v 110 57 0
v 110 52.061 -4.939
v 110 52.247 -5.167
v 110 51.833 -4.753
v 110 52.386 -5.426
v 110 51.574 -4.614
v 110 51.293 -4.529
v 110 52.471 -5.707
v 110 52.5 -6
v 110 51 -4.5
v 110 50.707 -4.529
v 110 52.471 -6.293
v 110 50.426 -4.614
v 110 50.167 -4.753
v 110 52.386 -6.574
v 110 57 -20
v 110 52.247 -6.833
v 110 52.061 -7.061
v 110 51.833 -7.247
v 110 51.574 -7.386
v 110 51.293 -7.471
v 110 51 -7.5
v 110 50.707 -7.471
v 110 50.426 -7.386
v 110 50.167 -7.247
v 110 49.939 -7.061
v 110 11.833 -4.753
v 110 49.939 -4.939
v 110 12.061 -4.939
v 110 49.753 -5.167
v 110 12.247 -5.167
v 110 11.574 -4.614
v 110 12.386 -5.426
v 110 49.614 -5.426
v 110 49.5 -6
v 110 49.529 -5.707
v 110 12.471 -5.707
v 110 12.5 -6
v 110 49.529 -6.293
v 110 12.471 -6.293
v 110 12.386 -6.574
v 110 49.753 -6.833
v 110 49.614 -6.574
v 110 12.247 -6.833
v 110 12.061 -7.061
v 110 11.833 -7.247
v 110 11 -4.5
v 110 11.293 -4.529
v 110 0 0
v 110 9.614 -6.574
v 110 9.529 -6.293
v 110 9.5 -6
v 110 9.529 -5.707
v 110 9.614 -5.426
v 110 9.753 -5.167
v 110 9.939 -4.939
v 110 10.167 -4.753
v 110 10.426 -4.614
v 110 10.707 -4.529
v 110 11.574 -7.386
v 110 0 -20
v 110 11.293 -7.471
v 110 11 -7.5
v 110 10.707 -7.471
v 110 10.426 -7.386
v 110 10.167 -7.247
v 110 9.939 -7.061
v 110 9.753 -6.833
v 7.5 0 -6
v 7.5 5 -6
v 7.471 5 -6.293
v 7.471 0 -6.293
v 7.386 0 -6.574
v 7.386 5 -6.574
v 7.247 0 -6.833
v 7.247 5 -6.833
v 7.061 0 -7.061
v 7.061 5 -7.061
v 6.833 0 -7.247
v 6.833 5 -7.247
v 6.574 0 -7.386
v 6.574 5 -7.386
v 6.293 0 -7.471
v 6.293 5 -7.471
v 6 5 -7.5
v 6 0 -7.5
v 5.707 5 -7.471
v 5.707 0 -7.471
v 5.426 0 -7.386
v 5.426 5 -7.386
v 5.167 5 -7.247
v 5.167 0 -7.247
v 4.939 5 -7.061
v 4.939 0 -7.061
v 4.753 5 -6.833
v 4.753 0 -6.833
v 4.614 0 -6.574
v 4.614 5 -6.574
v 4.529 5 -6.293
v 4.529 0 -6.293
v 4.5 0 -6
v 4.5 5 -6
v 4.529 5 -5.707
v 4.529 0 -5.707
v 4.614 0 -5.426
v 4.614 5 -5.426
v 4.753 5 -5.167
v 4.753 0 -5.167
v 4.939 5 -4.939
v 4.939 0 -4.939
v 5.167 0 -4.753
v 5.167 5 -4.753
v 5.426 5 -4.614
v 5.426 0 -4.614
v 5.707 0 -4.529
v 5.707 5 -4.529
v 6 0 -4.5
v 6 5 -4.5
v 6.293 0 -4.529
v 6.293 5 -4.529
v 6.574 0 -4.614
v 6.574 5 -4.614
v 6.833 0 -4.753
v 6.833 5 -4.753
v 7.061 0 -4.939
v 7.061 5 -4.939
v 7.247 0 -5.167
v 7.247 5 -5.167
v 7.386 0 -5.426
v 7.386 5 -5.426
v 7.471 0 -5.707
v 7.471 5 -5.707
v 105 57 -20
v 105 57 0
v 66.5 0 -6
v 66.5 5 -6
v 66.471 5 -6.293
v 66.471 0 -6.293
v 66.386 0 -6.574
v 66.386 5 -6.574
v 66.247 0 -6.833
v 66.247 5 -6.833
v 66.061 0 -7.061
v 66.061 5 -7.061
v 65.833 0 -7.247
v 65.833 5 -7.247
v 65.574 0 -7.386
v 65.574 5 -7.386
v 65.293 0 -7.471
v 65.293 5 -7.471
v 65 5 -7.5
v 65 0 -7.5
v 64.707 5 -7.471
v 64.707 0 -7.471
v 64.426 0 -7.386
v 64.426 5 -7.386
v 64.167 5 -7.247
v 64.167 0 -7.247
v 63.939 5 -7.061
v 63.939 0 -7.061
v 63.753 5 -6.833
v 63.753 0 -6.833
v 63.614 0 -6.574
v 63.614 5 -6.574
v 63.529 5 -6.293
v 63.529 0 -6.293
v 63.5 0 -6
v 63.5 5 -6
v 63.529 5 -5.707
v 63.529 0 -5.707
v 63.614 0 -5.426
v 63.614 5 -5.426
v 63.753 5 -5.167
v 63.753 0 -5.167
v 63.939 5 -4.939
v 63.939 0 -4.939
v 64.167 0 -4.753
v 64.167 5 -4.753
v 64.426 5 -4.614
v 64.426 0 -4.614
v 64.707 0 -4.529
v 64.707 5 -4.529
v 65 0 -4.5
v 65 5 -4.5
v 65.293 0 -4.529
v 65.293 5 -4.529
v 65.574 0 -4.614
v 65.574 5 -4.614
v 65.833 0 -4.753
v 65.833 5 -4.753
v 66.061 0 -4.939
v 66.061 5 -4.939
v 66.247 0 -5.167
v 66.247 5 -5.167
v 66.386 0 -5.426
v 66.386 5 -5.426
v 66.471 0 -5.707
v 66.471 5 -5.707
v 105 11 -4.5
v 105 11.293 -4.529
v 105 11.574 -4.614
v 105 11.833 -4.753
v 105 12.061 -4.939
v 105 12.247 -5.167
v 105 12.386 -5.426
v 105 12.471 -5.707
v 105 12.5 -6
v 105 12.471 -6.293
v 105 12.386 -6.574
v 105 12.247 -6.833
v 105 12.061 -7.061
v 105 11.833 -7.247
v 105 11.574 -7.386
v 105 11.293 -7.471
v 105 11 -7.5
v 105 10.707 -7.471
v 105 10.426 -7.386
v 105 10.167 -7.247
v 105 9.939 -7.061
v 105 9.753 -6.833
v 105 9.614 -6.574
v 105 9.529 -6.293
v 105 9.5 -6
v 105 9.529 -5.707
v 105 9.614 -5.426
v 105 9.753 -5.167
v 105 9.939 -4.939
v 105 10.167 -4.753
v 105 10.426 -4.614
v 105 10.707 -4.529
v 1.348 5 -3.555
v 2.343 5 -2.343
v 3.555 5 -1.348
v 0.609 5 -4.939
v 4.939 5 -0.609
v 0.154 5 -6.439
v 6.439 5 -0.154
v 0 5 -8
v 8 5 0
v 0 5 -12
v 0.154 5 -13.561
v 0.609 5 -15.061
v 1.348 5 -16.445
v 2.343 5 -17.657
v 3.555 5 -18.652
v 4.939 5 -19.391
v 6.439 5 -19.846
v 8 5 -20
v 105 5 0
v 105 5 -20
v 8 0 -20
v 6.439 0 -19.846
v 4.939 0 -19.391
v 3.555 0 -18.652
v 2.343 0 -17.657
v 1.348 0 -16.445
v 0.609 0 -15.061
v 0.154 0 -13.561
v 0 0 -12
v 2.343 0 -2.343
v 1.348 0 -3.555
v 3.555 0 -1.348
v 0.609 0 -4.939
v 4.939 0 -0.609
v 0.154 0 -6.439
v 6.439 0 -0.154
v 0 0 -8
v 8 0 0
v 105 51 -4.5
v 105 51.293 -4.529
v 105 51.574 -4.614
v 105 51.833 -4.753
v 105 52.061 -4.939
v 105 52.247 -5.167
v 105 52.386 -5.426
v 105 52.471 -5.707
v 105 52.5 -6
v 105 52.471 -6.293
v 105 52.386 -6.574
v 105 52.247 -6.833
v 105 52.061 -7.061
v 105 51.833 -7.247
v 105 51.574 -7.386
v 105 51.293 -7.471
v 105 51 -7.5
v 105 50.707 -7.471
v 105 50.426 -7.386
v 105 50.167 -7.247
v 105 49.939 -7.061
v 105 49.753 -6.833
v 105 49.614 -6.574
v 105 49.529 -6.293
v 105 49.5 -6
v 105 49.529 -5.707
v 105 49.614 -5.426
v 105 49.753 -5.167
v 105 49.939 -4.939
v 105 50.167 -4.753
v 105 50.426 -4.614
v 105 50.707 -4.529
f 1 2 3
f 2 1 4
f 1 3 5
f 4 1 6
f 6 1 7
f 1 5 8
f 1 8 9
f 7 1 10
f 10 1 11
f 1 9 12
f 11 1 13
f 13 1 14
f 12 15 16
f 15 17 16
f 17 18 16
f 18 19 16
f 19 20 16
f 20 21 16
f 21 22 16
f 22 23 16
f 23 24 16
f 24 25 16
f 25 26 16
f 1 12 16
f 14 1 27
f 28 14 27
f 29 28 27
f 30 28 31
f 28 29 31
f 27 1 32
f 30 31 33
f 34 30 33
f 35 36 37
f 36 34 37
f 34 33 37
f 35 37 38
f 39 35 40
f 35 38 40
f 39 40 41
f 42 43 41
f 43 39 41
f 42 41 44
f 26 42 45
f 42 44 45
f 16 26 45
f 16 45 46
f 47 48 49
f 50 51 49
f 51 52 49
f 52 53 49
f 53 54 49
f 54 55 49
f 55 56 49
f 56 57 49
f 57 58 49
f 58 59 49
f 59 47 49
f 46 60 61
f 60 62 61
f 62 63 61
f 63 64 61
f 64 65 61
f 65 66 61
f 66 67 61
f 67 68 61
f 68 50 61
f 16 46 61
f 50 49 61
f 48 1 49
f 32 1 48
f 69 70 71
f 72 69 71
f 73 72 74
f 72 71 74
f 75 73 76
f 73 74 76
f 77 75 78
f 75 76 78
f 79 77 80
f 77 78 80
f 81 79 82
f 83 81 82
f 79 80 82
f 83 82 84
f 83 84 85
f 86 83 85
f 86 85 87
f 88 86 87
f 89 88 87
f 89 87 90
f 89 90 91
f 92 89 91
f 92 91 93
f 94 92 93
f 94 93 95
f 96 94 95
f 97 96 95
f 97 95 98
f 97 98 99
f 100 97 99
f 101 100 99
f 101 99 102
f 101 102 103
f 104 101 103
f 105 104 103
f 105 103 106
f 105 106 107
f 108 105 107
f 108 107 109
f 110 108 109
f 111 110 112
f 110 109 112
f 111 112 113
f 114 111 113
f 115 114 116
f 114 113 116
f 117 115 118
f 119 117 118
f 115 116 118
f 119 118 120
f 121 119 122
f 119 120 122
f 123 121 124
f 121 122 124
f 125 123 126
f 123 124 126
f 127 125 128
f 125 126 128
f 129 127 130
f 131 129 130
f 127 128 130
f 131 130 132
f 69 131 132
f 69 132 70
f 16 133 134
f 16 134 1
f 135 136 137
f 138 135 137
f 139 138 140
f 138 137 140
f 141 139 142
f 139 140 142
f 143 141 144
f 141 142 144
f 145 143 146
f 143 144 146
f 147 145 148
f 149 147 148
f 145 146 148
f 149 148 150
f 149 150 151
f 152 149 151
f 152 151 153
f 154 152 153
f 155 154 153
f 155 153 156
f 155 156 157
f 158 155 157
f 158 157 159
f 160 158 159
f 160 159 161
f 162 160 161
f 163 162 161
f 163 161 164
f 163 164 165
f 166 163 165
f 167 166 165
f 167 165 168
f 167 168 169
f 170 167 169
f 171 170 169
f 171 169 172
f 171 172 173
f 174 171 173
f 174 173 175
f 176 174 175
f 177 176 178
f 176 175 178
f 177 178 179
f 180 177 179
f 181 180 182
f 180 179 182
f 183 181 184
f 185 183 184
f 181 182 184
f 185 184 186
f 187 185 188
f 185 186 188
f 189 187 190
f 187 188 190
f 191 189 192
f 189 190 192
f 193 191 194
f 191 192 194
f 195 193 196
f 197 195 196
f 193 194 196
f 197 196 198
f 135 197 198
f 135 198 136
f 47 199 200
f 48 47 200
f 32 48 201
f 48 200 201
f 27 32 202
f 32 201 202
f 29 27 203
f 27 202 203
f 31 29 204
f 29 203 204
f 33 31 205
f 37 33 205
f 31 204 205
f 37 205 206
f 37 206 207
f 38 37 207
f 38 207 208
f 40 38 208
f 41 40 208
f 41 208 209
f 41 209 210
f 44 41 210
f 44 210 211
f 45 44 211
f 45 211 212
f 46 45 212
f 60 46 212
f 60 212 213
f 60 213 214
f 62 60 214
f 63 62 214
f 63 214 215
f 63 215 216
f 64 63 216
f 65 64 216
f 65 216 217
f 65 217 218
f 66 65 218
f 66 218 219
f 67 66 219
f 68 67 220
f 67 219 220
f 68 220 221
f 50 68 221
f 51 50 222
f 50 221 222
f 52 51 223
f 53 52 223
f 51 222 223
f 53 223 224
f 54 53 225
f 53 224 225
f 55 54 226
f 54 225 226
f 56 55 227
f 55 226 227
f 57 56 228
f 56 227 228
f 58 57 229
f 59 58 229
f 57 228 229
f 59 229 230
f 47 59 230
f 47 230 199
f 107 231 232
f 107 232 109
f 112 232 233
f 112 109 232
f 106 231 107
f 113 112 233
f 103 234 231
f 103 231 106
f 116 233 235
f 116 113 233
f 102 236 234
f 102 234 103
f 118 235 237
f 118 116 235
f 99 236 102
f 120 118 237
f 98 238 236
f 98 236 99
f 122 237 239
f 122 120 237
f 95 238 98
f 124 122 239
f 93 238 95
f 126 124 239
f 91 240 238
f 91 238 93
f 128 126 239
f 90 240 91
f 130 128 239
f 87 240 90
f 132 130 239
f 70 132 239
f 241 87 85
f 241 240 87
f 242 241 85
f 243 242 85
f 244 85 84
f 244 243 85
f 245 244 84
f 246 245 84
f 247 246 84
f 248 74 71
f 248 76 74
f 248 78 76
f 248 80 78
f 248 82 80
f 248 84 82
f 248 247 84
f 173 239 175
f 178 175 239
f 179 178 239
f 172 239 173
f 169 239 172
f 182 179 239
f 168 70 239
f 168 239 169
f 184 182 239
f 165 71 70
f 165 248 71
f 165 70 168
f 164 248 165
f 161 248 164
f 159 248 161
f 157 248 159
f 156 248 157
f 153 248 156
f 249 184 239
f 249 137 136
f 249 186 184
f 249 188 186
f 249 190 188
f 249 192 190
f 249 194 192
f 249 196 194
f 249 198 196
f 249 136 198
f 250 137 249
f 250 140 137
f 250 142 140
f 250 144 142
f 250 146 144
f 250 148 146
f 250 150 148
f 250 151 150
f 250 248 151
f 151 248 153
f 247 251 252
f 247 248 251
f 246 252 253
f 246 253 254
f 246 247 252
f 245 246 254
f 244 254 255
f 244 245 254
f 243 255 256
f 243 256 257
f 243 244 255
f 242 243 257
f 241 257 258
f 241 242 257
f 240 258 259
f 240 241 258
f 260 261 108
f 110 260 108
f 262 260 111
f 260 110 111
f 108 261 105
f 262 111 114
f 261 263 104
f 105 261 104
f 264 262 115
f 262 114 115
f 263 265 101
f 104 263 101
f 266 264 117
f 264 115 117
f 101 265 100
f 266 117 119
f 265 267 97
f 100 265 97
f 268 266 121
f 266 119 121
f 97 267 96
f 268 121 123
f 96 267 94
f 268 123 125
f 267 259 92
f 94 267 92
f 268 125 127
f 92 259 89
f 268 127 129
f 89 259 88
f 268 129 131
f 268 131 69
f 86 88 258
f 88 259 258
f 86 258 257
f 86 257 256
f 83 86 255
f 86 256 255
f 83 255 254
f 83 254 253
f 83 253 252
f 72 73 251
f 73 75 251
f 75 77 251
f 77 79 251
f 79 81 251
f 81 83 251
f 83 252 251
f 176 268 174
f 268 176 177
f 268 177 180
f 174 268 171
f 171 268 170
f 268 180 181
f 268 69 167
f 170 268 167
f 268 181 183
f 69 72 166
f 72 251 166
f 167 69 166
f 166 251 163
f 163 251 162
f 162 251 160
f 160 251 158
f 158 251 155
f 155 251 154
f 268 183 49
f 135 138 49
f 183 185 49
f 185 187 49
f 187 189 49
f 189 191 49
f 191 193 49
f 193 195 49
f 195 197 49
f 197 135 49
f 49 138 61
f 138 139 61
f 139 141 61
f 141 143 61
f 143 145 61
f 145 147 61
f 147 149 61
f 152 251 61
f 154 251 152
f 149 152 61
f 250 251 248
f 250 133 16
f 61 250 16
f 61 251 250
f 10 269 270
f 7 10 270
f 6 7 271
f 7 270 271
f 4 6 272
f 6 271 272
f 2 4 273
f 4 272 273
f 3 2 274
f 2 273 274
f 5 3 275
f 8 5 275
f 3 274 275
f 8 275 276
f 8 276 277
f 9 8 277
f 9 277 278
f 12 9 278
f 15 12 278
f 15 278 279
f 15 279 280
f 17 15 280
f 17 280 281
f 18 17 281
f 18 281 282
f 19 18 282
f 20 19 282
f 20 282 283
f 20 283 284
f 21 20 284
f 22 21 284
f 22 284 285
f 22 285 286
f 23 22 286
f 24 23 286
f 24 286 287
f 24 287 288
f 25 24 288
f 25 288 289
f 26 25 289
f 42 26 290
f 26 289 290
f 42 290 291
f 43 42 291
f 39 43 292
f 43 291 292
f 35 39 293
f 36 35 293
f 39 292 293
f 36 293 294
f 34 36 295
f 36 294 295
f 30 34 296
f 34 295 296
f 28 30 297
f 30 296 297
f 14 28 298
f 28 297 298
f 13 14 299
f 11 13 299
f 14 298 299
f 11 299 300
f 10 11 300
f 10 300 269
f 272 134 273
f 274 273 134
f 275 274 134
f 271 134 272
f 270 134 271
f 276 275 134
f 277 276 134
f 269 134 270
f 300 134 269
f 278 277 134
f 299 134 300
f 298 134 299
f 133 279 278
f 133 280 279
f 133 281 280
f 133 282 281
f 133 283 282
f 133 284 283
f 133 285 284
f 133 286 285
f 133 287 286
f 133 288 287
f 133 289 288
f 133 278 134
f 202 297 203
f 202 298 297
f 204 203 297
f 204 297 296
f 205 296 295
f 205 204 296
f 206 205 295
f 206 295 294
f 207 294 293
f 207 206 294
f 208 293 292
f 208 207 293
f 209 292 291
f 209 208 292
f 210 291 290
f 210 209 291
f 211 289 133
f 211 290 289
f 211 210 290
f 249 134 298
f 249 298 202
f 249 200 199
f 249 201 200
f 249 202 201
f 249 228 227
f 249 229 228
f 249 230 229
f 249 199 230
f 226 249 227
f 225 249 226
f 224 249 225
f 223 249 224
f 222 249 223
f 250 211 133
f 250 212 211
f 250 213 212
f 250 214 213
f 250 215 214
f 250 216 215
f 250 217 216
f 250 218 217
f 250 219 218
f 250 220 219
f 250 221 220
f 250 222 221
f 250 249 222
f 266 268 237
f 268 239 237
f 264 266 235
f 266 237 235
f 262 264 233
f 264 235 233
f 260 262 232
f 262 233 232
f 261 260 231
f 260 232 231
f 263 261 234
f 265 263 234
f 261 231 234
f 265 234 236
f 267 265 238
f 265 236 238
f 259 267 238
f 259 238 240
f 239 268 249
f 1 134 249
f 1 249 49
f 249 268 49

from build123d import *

# Parameters (mm, degrees)
SKETCH1_W           = 110
SKETCH1_H           = 20
BOSS_EXTRUDE1_DEPTH = 5
SKETCH2_W           = 5
SKETCH2_H           = 20
BOSS_EXTRUDE2_DEPTH = 52
SKETCH3_R           = 1.5
CUT_EXTRUDE1_DEPTH  = 6
FILLET1_R           = 8
SKETCH4_R           = 1.5
CUT_EXTRUDE2_DEPTH  = 6


with BuildPart() as part:
    # Sketch1 → Boss-Extrude1 (new body)
    with BuildSketch(Plane(origin=(0, 0, 0), x_dir=(1, 0, 0), z_dir=(0, 1, 0))):
        with Locations((55, 10)):
            Rectangle(SKETCH1_W, SKETCH1_H)
    extrude(amount=BOSS_EXTRUDE1_DEPTH)

    # Sketch2 → Boss-Extrude2 (add)
    with BuildSketch(Plane(origin=(0, 5, 0), x_dir=(1, 0, 0), z_dir=(0, 1, 0))):
        with Locations((107.5, 10)):
            Rectangle(SKETCH2_W, SKETCH2_H)
    extrude(amount=BOSS_EXTRUDE2_DEPTH)

    # Sketch3 → Cut-Extrude1 (cut, through all)
    with BuildSketch(Plane(origin=(0, 5, 0), x_dir=(1, 0, 0), z_dir=(0, 1, 0))):
        with Locations((6, 6)):
            Circle(SKETCH3_R)
        with Locations((65, 6)):
            Circle(SKETCH3_R)
    extrude(amount=-CUT_EXTRUDE1_DEPTH, mode=Mode.SUBTRACT)

    # Fillet1
    fillet1_edges = [part.edges().sort_by_distance(p)[0] for p in [
        (0, 2.5, 0),
        (0, 2.5, -20),
    ]]
    fillet(fillet1_edges, radius=FILLET1_R)

    # Sketch4 → Cut-Extrude2 (cut, through all)
    with BuildSketch(Plane.ZY.offset(-105)):
        with Locations((-6, 11)):
            Circle(SKETCH4_R)
        with Locations((-6, 51)):
            Circle(SKETCH4_R)
    extrude(amount=-CUT_EXTRUDE2_DEPTH, mode=Mode.SUBTRACT)


solid = part.part
